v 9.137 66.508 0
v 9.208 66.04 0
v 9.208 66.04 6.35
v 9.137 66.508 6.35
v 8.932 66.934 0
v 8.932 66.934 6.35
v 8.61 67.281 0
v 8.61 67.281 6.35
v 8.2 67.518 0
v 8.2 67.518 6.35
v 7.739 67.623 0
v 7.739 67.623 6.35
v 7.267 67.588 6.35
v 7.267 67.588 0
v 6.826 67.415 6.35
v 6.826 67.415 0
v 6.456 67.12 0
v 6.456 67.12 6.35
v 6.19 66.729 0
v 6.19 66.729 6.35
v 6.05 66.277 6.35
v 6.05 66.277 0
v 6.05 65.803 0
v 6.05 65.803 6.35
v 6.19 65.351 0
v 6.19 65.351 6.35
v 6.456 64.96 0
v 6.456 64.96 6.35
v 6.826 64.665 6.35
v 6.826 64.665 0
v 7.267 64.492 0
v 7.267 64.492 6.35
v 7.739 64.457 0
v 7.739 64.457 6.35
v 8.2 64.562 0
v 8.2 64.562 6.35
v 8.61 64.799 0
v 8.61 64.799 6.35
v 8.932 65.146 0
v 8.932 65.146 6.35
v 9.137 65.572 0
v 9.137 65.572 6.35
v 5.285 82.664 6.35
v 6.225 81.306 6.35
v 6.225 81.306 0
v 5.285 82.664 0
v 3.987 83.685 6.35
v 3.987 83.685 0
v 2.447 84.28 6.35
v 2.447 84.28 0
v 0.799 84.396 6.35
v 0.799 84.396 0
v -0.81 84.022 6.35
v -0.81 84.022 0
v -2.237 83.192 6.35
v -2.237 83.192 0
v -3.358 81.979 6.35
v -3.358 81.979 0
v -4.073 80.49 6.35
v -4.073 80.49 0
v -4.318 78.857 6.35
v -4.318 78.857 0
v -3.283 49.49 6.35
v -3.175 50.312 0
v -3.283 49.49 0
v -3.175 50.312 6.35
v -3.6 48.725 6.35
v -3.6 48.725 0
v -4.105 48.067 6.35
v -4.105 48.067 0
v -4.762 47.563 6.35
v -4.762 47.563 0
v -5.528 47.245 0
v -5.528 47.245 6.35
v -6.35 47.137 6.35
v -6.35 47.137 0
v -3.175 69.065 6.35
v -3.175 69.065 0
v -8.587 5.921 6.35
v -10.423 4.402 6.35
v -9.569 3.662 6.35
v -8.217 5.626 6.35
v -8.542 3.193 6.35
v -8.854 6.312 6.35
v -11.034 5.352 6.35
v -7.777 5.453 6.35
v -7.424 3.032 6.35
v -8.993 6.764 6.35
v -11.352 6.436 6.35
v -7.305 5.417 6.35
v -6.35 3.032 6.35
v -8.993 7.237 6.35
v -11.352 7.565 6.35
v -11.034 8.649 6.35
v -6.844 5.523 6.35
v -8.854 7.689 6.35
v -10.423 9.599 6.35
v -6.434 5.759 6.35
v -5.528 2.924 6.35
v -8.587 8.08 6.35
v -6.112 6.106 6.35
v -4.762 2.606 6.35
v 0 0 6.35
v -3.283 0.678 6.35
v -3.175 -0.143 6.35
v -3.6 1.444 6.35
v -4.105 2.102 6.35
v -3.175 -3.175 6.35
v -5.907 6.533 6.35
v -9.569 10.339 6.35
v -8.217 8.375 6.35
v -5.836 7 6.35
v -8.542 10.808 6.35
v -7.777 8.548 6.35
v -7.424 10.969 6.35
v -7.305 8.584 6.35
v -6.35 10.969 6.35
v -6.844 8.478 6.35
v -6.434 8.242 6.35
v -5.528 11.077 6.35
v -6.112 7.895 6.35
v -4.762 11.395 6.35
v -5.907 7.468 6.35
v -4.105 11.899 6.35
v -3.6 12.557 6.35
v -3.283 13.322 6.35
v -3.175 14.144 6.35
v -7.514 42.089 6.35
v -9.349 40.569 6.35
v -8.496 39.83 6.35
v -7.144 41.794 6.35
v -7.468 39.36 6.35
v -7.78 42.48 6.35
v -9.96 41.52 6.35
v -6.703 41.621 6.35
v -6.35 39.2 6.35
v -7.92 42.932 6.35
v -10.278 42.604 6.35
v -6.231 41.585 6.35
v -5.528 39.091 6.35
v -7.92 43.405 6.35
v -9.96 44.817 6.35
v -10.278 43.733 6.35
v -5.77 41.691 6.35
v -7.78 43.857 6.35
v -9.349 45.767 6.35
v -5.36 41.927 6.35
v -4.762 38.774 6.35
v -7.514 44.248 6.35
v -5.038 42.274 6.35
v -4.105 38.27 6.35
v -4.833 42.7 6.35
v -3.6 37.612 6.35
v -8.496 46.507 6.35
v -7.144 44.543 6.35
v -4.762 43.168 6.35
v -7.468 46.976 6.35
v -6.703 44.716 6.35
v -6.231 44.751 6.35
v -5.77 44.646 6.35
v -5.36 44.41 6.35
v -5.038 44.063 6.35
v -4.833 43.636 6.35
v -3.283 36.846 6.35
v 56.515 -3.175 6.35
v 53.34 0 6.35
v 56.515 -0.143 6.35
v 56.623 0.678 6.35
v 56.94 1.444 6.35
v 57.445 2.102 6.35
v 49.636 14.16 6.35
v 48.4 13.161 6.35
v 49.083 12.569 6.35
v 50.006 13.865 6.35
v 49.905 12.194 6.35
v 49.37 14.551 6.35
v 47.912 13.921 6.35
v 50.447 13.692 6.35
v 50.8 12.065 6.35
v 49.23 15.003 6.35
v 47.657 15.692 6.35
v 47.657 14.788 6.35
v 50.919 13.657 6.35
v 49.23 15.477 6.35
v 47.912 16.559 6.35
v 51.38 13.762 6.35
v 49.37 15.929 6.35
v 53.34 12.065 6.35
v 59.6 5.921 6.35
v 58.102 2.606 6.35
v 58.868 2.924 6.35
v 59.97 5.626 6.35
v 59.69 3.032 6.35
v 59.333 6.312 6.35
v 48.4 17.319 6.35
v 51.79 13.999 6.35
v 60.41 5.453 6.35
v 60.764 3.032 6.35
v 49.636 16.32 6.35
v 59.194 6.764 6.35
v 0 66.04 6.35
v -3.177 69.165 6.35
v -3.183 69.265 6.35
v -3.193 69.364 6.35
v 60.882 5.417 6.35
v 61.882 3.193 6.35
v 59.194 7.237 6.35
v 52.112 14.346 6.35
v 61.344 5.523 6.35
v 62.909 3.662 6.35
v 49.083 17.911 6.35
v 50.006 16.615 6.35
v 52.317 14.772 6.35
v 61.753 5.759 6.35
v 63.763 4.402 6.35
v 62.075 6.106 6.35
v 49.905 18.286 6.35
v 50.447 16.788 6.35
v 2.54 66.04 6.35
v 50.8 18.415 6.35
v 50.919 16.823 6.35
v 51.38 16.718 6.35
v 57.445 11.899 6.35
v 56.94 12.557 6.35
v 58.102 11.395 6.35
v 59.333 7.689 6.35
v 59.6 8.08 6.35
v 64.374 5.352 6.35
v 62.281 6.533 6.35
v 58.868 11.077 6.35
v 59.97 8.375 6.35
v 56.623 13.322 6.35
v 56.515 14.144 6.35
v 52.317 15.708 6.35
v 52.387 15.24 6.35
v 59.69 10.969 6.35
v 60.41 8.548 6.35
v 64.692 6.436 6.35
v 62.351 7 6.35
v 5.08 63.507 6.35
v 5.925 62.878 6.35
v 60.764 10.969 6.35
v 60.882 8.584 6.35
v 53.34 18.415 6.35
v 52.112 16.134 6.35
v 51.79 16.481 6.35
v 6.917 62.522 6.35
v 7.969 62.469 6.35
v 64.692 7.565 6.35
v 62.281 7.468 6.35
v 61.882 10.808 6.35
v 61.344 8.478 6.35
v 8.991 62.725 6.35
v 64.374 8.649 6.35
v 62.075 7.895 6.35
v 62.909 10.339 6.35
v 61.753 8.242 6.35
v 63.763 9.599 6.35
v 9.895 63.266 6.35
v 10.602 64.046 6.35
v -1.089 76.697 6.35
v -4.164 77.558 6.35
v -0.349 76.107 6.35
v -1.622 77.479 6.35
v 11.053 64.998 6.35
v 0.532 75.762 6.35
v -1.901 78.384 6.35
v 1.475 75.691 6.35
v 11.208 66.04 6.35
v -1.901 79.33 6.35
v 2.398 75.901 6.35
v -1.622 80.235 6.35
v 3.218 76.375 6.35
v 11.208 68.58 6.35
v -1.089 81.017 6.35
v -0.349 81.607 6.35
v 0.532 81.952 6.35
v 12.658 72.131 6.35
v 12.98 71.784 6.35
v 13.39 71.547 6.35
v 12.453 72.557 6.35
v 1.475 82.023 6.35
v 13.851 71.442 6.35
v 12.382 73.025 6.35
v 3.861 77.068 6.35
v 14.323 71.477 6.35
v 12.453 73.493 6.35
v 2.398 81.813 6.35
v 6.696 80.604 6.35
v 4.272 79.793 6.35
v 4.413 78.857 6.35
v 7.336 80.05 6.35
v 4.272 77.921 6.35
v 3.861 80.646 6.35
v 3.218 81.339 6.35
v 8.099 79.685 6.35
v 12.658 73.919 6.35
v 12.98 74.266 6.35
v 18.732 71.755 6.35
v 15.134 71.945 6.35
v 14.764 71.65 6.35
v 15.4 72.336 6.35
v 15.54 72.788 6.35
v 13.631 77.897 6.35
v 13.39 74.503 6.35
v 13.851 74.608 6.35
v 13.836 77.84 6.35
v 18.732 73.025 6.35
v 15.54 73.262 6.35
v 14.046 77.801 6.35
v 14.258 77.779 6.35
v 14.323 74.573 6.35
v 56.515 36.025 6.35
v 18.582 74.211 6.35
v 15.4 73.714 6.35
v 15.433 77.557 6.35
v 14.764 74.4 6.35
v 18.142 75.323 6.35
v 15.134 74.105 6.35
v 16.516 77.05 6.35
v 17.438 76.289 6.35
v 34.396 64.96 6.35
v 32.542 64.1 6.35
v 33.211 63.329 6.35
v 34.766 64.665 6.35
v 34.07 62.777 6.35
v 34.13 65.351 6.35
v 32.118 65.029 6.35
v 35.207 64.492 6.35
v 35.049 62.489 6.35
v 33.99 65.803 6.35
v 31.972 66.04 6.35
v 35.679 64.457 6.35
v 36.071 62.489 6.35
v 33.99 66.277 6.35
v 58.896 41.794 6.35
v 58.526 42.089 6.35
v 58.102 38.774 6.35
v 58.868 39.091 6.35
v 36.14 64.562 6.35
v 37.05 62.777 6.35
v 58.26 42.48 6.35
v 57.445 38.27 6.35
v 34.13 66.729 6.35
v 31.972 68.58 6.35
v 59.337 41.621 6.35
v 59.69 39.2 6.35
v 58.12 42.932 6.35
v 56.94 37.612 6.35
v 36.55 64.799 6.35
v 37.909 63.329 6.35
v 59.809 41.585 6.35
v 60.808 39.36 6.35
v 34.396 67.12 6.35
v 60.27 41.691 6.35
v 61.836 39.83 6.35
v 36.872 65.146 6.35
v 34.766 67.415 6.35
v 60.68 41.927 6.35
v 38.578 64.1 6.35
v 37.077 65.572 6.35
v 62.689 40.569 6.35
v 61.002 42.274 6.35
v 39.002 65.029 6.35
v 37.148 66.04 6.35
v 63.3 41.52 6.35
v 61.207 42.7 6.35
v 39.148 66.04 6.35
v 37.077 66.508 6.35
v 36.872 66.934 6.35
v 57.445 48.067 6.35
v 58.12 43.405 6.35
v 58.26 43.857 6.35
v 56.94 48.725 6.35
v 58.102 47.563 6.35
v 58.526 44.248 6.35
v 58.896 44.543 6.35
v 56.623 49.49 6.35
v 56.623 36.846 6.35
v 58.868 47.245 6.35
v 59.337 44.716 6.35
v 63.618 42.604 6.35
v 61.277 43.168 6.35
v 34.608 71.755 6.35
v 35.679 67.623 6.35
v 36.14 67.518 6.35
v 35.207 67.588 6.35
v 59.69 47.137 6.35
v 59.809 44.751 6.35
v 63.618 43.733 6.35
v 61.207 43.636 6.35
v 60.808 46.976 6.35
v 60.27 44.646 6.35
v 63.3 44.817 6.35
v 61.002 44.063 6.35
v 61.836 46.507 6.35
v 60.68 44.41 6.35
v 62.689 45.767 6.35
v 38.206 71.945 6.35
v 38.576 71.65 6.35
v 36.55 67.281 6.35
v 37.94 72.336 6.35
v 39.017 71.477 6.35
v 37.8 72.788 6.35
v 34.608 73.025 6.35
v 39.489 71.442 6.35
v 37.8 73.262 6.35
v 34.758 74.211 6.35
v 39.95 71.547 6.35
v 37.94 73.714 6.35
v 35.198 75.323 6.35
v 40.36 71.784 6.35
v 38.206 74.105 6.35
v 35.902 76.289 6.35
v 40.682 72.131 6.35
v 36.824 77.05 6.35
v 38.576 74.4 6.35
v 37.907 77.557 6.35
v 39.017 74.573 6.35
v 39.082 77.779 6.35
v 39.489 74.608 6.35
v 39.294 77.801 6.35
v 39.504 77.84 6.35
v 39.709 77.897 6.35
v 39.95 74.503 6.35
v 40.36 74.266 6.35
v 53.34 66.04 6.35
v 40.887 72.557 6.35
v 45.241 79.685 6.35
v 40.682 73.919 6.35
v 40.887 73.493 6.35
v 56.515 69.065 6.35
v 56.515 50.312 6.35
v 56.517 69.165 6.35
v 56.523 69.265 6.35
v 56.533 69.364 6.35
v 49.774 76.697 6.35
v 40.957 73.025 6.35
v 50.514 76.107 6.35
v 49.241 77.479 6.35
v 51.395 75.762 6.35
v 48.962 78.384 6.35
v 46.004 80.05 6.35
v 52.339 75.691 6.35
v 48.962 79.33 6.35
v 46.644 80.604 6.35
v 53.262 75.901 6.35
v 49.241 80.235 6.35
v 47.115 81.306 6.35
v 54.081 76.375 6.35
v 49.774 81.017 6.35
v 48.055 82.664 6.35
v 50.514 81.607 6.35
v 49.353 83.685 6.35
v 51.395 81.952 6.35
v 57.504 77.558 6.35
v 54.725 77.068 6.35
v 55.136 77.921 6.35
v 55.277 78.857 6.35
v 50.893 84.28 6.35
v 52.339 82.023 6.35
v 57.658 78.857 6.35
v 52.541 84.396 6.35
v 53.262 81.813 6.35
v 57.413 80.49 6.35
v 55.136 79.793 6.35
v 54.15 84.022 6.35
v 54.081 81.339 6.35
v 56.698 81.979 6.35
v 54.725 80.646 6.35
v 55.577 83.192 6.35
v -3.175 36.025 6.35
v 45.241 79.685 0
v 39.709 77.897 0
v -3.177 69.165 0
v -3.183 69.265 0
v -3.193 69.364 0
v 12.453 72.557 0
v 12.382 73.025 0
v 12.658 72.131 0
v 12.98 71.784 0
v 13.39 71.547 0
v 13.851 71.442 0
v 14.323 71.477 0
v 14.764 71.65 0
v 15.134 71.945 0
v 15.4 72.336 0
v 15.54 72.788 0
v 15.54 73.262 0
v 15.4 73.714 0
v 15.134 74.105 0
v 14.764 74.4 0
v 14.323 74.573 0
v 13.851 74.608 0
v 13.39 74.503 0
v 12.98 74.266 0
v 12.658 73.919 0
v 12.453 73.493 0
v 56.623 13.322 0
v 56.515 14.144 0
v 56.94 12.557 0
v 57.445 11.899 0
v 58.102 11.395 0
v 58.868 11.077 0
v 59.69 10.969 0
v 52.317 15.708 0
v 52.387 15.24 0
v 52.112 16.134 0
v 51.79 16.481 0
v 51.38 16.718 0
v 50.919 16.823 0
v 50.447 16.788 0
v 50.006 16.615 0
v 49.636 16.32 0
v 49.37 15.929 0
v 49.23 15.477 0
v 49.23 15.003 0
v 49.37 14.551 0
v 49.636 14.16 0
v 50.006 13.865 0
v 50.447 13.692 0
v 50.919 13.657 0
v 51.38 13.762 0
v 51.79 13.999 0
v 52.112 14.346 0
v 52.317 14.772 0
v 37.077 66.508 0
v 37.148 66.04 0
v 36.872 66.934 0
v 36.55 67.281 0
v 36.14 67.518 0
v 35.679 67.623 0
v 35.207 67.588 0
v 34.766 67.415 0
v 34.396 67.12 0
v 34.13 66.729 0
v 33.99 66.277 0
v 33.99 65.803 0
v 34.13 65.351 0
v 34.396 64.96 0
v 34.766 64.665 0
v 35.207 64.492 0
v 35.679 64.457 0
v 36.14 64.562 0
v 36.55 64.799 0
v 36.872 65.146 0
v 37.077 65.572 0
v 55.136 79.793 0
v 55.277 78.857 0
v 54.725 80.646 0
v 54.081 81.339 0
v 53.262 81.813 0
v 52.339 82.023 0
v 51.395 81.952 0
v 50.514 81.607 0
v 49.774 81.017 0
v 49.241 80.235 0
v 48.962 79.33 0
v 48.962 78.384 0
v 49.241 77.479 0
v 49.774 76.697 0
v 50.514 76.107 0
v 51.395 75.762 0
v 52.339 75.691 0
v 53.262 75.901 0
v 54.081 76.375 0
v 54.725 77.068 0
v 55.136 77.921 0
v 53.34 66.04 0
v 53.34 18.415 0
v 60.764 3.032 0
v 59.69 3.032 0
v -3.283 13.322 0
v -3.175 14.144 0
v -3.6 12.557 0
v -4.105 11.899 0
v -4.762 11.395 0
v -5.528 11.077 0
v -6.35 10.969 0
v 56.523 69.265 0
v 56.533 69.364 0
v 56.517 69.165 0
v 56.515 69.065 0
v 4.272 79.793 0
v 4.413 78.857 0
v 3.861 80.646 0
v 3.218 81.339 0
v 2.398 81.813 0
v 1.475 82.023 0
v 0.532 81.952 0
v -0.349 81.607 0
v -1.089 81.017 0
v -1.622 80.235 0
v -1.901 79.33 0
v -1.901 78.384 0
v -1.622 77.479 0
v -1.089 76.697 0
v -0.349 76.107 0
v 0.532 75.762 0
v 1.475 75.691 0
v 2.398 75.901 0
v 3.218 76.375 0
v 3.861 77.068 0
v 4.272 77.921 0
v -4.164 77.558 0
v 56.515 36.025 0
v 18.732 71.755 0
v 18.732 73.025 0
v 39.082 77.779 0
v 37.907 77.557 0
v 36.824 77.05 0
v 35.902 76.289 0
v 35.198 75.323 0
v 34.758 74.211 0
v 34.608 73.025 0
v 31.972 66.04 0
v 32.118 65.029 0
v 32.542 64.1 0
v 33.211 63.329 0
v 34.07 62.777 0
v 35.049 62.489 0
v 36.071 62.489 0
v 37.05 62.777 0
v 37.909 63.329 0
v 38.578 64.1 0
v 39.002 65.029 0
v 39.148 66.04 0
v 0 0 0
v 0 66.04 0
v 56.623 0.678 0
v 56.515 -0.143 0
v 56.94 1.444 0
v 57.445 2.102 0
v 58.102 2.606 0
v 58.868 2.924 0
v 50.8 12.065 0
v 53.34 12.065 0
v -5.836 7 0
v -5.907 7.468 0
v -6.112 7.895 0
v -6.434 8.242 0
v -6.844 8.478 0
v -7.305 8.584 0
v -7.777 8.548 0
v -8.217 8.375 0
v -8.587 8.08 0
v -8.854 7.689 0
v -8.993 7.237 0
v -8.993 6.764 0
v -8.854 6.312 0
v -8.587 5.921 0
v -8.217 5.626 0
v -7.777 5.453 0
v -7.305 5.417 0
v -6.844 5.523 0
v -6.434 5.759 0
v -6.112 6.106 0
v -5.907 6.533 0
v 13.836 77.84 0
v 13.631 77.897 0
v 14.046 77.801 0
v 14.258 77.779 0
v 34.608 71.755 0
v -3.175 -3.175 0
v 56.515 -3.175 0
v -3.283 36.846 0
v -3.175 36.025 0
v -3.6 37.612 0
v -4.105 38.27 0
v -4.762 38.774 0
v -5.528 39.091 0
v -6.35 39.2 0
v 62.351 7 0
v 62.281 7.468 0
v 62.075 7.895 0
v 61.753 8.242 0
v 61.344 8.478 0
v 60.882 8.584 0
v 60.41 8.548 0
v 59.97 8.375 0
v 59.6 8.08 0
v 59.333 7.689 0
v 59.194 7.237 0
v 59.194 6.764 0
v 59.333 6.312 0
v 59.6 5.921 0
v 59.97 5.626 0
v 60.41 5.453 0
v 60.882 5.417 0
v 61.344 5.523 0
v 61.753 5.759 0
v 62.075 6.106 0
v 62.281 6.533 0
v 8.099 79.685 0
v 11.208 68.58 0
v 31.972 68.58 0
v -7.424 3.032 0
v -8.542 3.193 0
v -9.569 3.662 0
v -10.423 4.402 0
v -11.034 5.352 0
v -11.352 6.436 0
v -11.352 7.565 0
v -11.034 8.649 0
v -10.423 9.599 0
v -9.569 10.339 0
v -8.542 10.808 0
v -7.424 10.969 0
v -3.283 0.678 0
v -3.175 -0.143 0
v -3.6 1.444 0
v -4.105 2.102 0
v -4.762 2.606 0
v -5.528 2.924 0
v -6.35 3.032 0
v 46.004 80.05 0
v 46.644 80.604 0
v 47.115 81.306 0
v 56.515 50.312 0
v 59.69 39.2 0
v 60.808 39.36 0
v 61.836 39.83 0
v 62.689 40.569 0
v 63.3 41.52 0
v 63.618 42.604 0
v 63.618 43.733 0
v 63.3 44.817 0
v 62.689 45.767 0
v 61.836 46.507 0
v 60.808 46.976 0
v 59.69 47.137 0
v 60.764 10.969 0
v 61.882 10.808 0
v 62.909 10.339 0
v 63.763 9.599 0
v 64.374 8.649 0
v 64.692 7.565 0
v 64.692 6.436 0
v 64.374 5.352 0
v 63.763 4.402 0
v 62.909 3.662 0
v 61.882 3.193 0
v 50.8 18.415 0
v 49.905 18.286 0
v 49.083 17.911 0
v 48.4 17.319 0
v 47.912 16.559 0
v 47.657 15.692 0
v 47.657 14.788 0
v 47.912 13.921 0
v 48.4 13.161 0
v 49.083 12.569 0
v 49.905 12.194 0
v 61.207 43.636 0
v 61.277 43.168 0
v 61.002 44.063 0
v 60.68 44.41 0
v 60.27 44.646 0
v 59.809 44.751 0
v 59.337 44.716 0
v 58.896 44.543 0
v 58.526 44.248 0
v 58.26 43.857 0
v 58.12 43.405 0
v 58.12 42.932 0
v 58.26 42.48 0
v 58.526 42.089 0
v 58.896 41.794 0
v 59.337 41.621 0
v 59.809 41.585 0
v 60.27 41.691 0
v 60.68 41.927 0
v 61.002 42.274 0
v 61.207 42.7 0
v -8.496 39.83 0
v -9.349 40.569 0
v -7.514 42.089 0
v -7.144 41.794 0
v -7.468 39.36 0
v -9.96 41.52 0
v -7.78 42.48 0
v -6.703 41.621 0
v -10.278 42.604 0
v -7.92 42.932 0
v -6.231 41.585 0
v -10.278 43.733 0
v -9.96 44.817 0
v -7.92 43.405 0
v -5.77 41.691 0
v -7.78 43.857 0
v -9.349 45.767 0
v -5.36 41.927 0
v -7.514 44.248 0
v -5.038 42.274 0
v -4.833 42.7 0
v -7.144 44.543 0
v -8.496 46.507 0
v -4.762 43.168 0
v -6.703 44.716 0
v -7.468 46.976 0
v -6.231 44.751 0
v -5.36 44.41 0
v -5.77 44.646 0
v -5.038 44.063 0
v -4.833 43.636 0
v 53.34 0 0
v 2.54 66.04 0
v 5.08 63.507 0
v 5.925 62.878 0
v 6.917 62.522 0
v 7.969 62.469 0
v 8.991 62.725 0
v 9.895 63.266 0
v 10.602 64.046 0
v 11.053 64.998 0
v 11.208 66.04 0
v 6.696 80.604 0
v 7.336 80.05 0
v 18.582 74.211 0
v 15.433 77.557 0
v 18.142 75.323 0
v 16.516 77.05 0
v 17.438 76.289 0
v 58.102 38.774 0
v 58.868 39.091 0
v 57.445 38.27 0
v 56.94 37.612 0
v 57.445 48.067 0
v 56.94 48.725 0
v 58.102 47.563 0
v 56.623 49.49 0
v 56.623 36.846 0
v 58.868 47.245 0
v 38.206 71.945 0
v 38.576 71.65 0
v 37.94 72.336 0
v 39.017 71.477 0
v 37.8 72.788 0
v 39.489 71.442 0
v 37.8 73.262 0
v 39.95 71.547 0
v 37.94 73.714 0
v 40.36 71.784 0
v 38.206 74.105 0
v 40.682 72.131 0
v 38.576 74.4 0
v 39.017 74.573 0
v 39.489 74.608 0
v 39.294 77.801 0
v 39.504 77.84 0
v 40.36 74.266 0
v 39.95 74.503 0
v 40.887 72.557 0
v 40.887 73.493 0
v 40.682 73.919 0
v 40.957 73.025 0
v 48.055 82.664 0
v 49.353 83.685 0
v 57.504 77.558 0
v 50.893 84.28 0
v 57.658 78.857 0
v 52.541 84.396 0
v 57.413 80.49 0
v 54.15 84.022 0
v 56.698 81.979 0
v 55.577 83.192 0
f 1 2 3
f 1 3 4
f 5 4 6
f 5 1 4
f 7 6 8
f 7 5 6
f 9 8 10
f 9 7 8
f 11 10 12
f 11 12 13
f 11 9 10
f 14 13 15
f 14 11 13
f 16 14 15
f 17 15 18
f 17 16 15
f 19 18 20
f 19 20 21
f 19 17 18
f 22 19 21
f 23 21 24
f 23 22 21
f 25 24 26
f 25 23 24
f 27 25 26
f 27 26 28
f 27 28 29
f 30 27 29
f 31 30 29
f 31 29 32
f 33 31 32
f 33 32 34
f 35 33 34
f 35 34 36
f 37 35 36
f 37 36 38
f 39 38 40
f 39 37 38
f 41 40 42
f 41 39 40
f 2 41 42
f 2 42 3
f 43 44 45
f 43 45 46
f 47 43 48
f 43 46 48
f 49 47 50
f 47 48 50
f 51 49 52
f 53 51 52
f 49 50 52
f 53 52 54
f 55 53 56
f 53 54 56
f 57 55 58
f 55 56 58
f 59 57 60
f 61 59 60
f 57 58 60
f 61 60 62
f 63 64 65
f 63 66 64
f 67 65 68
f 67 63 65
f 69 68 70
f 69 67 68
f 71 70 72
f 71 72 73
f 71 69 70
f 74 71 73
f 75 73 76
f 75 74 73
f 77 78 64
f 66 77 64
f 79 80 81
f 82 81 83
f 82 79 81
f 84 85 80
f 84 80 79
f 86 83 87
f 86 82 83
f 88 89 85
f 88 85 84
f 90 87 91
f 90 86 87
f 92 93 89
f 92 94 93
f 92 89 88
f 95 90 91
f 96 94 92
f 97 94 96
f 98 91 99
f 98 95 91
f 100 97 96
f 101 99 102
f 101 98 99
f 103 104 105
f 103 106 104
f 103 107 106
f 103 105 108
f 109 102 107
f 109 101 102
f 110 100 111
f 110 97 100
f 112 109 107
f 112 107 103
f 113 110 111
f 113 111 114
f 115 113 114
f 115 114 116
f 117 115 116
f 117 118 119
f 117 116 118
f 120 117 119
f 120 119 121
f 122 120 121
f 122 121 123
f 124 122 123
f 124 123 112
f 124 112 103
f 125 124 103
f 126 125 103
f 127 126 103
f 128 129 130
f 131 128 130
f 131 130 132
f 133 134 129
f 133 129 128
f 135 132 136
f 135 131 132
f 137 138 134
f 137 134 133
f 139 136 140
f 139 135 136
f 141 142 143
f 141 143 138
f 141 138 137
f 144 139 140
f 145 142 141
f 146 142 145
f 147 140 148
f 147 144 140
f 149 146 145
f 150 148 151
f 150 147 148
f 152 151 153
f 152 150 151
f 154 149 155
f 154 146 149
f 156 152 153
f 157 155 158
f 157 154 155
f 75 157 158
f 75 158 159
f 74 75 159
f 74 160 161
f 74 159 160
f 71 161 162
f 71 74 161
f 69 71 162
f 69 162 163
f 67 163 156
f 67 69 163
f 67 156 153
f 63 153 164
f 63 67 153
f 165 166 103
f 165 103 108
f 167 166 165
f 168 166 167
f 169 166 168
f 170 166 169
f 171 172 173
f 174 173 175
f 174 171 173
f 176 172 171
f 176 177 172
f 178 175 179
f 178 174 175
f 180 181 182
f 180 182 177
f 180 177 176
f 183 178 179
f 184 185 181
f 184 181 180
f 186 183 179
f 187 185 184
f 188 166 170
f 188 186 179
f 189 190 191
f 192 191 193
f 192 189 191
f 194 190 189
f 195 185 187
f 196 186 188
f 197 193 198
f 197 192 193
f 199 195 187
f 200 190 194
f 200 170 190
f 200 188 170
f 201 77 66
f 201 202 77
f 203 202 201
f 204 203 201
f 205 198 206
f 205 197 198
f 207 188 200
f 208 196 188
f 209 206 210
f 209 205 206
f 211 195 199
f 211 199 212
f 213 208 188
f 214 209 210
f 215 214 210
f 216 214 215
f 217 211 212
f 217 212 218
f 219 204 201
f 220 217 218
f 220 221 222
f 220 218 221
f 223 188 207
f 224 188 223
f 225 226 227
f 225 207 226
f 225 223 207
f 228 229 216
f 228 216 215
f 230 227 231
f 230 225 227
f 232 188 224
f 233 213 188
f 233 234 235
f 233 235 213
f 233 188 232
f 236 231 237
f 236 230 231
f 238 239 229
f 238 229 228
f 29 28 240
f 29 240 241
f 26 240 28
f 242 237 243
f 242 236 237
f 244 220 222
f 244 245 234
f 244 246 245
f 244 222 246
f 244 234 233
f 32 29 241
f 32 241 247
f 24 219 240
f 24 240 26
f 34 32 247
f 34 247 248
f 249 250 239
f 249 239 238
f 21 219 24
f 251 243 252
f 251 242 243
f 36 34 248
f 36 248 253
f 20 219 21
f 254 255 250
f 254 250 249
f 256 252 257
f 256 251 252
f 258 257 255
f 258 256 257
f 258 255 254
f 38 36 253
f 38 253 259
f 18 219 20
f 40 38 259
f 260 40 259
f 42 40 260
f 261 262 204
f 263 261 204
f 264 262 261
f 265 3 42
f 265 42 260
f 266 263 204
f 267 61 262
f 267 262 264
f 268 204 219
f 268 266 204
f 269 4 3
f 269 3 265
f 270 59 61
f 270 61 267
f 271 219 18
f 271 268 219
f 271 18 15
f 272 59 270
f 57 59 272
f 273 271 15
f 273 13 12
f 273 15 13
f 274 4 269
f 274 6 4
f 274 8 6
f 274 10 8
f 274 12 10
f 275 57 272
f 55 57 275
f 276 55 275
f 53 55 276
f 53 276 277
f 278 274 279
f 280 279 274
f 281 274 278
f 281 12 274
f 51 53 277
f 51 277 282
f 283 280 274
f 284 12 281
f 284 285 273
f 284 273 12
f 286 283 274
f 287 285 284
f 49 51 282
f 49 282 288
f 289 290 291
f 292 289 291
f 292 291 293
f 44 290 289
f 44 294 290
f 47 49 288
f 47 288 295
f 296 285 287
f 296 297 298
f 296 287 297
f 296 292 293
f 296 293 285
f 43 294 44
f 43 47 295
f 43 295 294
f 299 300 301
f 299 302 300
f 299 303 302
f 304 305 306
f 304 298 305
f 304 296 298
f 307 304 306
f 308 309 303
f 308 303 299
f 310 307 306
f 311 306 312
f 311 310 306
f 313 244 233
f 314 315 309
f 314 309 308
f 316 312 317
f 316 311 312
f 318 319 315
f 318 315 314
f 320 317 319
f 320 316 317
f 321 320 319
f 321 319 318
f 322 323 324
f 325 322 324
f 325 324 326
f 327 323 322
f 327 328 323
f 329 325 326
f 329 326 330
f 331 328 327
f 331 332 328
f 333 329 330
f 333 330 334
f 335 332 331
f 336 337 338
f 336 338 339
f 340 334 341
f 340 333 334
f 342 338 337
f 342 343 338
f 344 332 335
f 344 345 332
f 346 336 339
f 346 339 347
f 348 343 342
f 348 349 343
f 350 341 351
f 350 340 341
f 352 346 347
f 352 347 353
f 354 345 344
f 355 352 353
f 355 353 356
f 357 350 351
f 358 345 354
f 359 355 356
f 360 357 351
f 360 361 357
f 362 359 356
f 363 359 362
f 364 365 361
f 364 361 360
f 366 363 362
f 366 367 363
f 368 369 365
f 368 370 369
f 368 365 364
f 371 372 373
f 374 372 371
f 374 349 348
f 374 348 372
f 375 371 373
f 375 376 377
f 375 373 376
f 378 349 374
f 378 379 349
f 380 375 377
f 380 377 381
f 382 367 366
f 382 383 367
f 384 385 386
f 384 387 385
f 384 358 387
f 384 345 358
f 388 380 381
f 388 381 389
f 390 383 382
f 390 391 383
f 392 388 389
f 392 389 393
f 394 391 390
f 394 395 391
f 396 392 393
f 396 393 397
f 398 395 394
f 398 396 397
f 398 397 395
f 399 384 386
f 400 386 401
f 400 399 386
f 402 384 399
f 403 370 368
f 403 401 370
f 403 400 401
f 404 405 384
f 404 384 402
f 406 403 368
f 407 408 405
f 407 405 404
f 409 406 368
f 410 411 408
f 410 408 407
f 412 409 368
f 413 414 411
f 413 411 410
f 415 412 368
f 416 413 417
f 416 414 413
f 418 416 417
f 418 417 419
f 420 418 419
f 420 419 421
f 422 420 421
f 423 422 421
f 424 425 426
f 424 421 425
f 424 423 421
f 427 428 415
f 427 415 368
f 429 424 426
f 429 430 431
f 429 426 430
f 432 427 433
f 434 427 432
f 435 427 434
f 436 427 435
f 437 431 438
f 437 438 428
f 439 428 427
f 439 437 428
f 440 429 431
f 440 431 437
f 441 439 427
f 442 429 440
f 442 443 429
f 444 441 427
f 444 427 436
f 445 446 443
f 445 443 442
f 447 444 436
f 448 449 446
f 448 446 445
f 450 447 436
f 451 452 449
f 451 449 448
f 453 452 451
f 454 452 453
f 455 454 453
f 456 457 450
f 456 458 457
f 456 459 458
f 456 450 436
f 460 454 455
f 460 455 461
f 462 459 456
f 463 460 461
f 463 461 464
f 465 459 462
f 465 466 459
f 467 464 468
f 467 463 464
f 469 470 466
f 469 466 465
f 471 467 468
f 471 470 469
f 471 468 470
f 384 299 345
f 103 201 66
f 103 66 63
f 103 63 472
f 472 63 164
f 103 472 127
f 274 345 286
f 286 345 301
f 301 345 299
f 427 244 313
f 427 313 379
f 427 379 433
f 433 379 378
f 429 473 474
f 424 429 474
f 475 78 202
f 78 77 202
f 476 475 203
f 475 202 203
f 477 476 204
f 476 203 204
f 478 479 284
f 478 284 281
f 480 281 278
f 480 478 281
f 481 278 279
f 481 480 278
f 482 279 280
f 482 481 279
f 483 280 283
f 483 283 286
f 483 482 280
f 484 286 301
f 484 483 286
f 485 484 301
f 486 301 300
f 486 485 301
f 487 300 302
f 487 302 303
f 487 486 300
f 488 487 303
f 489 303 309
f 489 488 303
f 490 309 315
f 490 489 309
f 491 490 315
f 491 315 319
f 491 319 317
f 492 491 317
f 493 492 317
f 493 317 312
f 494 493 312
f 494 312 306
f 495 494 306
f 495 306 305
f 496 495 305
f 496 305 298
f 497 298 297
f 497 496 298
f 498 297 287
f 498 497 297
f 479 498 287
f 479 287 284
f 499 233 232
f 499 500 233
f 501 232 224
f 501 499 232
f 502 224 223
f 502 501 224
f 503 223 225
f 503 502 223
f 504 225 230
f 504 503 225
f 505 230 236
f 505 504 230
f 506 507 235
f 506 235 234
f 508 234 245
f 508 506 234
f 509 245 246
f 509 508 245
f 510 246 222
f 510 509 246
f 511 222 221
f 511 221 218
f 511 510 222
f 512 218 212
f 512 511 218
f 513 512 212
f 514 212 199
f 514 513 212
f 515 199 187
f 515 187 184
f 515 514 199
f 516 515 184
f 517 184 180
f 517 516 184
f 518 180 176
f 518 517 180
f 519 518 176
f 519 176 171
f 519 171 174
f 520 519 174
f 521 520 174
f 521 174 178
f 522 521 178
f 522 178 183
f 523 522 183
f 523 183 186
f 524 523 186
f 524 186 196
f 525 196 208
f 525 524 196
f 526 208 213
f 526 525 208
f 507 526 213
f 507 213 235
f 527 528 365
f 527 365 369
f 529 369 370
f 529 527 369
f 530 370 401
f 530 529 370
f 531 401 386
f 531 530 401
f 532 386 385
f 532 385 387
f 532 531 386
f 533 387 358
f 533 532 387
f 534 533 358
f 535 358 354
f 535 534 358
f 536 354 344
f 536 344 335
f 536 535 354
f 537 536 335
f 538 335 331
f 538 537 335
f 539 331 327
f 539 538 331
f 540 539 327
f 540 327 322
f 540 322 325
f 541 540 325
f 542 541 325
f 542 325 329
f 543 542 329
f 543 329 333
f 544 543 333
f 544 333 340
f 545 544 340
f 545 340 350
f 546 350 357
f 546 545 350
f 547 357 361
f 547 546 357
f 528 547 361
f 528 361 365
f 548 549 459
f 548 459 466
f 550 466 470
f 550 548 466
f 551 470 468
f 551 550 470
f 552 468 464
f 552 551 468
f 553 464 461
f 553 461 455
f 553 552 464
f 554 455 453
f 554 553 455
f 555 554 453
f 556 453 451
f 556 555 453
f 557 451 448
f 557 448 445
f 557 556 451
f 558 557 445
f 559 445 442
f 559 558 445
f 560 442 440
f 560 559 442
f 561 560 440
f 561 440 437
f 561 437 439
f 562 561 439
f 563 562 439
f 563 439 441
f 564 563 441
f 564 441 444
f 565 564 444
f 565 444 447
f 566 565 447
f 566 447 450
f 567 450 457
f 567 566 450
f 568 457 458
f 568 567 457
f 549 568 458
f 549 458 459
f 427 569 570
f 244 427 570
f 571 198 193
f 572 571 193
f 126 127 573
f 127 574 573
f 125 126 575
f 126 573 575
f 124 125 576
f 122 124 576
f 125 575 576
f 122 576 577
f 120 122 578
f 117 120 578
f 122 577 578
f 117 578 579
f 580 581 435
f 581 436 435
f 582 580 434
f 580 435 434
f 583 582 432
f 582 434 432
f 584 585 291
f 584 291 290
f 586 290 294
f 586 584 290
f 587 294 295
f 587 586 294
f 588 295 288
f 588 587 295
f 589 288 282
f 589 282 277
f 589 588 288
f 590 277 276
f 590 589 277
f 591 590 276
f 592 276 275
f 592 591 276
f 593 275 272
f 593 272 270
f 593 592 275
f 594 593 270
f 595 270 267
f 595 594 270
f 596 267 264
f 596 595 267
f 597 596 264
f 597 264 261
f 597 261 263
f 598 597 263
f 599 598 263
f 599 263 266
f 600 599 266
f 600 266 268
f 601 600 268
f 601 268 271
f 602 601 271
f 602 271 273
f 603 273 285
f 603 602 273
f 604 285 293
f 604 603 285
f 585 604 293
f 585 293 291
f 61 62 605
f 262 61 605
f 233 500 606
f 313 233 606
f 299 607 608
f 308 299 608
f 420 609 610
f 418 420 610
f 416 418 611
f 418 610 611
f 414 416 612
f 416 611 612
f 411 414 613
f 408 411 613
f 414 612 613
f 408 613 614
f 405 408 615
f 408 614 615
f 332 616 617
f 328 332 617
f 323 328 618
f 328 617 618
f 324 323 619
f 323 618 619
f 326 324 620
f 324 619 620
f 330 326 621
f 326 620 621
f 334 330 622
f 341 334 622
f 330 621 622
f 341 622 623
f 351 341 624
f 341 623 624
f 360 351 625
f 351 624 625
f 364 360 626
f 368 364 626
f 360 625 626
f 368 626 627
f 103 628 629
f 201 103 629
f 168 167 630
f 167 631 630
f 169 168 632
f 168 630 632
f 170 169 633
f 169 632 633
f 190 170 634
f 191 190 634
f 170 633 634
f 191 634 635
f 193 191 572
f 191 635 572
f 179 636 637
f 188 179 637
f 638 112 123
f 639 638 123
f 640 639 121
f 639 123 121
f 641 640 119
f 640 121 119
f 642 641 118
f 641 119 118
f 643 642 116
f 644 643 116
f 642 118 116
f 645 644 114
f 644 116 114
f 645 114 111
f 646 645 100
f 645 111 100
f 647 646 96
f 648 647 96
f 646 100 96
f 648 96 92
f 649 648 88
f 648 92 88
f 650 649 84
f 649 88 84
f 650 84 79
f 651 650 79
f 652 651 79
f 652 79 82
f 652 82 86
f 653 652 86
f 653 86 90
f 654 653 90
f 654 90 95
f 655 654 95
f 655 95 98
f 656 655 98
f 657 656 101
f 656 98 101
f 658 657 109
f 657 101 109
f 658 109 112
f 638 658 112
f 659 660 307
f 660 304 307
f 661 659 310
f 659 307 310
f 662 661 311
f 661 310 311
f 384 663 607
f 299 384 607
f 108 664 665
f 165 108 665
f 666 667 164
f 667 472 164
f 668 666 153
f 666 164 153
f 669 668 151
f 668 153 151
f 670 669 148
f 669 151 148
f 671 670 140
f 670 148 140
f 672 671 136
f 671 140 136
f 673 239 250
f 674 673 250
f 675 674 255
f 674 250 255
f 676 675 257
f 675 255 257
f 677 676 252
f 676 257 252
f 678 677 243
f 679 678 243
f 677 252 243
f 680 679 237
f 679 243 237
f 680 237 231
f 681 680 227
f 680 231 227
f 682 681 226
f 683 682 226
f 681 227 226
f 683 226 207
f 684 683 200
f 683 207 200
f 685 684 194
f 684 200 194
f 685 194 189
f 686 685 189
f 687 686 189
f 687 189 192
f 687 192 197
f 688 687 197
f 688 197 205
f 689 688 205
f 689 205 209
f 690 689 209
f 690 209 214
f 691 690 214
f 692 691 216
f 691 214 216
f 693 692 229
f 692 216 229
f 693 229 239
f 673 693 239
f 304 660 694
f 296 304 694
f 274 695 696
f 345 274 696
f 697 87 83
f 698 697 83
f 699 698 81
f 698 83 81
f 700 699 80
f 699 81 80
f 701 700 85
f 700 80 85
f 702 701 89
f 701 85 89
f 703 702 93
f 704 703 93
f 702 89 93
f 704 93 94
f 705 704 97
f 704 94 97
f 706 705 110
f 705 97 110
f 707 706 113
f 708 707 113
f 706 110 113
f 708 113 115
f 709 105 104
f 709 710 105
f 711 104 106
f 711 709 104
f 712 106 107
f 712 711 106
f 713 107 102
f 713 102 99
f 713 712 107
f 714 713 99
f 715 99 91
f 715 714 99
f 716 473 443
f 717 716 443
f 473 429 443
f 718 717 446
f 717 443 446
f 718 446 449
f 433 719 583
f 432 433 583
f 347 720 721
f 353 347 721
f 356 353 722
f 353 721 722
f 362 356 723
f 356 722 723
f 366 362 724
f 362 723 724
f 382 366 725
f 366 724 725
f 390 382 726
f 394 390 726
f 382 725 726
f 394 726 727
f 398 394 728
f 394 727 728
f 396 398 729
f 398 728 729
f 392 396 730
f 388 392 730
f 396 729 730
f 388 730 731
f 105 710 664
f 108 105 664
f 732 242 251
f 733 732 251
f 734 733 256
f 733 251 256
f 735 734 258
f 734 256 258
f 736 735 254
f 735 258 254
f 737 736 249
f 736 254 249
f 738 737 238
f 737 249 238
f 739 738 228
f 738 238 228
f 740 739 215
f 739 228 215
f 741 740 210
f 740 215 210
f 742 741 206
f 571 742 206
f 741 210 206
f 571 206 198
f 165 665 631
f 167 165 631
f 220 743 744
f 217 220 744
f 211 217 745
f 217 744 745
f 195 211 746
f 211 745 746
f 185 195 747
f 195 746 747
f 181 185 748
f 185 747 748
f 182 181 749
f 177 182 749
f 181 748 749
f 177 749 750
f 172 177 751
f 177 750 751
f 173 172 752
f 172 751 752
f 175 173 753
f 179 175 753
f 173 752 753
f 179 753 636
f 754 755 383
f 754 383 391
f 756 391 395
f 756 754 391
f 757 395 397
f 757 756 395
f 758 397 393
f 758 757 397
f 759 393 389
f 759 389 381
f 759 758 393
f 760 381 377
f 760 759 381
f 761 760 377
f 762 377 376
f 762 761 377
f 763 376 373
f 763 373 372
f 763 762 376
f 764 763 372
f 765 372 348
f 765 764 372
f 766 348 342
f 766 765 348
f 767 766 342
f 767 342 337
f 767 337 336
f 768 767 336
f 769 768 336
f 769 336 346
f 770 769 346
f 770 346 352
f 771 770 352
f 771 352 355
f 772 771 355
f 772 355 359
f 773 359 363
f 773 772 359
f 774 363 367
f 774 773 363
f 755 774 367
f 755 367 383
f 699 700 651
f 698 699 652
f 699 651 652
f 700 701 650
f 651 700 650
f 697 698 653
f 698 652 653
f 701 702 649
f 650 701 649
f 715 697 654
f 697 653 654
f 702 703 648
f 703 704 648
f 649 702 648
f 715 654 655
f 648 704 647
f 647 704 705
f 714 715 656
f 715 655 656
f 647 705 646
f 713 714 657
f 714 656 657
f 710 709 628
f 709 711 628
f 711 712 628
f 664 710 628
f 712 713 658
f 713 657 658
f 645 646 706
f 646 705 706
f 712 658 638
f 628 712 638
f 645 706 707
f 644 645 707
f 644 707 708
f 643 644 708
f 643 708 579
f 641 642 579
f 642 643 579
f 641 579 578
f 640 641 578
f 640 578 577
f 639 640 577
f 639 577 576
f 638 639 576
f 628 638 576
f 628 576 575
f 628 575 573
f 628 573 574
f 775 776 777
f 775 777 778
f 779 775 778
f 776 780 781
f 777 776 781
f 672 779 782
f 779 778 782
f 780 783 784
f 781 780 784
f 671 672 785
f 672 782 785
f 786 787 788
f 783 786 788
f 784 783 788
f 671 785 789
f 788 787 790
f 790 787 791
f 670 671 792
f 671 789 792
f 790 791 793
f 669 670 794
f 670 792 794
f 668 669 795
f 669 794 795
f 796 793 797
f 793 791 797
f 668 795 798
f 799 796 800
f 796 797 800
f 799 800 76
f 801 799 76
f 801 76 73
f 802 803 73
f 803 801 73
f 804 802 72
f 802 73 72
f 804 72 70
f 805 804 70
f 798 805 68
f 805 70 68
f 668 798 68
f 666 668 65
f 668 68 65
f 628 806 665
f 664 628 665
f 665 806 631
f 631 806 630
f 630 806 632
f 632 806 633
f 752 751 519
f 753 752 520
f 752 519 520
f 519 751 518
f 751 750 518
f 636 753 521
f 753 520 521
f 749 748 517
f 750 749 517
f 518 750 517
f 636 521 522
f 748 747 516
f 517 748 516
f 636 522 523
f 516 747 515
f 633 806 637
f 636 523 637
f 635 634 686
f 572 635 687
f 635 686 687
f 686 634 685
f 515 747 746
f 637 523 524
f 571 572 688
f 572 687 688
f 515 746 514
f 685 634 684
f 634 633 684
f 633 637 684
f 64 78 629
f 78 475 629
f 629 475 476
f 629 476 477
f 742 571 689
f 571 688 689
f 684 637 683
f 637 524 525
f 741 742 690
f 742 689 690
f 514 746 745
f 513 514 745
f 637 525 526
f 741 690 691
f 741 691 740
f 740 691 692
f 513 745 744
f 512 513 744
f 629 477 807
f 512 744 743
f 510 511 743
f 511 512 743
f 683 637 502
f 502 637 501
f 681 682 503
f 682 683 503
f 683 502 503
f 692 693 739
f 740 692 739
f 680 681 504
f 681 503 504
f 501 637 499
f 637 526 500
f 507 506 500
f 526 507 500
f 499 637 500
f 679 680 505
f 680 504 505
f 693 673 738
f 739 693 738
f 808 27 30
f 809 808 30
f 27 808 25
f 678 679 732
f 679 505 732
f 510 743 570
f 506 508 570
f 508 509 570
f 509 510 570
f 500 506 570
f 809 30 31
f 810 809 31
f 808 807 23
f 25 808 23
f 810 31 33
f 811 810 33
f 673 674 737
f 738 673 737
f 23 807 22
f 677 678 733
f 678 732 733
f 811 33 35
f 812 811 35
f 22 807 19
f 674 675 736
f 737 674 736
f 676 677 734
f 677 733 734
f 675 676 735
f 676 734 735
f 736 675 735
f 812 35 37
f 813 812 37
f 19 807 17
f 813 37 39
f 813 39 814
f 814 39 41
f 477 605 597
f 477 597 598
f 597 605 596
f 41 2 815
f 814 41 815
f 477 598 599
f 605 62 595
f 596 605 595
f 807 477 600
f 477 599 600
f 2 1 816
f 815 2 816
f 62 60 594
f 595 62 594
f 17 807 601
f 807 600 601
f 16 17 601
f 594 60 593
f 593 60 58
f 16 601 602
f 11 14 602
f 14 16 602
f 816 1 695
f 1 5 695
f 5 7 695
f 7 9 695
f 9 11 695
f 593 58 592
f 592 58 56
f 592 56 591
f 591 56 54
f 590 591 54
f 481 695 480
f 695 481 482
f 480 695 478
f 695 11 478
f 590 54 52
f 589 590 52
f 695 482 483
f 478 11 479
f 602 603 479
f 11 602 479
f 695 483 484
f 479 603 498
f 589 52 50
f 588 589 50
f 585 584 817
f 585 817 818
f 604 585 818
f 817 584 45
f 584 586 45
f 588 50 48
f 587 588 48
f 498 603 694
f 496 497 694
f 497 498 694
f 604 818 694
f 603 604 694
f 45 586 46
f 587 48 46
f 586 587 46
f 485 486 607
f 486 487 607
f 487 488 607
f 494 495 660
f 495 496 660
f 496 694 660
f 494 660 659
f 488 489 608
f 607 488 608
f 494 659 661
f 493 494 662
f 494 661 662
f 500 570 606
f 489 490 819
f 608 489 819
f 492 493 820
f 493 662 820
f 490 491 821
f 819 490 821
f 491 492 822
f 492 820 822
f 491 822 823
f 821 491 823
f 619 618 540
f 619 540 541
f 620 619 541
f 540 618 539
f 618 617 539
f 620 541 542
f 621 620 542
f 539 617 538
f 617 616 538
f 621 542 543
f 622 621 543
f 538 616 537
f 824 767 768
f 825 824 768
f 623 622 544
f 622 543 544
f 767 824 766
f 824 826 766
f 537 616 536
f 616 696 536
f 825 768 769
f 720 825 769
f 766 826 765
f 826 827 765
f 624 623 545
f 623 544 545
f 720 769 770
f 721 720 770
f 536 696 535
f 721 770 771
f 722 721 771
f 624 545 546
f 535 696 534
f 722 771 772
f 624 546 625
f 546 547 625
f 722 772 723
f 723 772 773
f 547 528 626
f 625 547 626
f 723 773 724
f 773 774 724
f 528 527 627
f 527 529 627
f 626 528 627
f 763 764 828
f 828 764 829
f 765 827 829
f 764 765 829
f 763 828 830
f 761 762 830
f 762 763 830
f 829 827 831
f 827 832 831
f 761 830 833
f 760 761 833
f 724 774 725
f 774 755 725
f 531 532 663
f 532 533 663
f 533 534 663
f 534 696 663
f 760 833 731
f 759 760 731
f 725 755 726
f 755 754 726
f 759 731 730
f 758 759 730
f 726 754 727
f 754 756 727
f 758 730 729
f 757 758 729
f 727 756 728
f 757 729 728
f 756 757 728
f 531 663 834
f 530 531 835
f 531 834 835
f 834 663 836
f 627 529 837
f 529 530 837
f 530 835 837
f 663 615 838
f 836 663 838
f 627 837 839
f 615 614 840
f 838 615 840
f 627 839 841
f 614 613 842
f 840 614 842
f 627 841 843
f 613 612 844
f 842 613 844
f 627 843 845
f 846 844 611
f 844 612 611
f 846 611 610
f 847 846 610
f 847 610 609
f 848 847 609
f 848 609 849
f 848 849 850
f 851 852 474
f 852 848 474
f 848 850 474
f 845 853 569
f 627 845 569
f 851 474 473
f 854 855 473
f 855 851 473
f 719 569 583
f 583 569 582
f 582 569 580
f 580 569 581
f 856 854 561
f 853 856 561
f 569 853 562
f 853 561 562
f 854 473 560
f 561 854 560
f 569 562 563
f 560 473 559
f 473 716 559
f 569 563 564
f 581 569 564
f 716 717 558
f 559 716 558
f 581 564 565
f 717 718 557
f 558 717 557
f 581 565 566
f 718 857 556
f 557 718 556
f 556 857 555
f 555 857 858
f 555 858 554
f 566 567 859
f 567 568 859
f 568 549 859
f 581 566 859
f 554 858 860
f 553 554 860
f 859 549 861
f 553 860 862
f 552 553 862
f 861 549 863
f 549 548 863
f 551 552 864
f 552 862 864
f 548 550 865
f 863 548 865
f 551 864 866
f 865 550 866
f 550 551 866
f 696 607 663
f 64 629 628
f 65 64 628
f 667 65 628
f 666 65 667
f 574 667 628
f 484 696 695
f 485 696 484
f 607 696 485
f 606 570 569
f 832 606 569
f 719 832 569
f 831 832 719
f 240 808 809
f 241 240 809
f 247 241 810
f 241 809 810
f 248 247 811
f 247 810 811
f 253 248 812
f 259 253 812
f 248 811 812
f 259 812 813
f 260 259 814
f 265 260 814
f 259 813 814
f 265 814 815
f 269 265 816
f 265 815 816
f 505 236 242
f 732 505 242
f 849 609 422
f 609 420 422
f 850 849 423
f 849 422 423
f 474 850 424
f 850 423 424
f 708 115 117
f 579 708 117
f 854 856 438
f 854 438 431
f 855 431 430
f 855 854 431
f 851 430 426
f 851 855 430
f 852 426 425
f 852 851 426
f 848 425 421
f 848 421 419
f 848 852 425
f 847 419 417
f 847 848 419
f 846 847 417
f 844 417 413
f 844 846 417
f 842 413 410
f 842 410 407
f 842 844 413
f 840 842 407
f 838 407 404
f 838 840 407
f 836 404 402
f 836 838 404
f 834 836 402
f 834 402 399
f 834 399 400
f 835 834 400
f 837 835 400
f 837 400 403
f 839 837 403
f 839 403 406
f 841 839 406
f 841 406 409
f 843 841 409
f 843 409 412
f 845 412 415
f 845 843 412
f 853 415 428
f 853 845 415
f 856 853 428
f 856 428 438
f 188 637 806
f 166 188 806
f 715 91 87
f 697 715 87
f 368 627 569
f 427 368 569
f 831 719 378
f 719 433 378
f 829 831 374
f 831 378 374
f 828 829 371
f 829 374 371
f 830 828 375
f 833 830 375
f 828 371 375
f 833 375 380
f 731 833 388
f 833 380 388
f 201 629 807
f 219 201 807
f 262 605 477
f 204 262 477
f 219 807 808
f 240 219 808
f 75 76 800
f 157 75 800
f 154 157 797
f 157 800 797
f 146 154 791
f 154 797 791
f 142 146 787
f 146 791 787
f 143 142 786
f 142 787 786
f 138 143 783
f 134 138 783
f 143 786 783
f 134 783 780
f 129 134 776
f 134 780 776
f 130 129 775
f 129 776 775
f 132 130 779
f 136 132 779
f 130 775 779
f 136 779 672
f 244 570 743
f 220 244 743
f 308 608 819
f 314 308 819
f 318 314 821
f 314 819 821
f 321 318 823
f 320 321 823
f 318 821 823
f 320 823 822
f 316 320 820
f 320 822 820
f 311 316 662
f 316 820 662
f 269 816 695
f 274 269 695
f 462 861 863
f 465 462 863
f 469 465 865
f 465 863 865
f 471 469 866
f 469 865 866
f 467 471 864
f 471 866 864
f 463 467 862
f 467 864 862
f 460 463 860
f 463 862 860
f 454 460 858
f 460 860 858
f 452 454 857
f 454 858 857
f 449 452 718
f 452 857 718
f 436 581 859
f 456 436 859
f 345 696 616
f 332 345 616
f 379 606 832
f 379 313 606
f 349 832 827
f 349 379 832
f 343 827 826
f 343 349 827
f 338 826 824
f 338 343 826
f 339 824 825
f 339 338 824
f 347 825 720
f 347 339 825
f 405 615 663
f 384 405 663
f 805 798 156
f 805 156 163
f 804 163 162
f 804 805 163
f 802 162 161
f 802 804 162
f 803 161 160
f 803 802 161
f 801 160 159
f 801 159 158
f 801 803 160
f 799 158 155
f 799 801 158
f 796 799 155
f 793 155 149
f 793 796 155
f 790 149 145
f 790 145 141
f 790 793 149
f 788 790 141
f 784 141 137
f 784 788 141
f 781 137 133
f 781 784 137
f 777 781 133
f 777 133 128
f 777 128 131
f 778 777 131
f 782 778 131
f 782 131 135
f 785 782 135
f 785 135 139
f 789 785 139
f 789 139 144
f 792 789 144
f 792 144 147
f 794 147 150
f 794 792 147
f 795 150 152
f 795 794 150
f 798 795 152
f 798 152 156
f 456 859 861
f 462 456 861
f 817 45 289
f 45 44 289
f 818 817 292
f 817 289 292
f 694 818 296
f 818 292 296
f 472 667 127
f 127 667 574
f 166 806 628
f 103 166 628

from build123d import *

# Parameters (mm, degrees)
SKETCH1_R           = 1.5875
BOSS_EXTRUDE1_DEPTH = 6.35
SKETCH3_R           = 1.5875
BOSS_EXTRUDE2_DEPTH = 6.35
FILLET1_R           = 3.175
BOSS_EXTRUDE3_START = -6.35
SKETCH4_R           = 3.175
SKETCH4_R_2         = 1.5875
BOSS_EXTRUDE3_DEPTH = 6.35
FILLET2_R           = 3.175
FILLET3_R           = 2.54


with BuildPart() as part:
    # Sketch1 → Boss-Extrude1 (new body)
    with BuildSketch(Plane.XY):
        with BuildLine():
            Line((13.97, -3.175), (39.37, -3.175))
            Line((39.37, -3.175), (56.515, -3.175))
            Line((56.515, -3.175), (56.515, 69.215))
            Line((56.515, 69.215), (41.625085175, 77.219758289))
            ThreePointArc((41.625085175, 77.219758289), (36.926481727, 77.112863097), (34.6075, 73.025))
            Line((34.6075, 73.025), (34.6075, 71.755))
            Line((34.6075, 71.755), (18.7325, 71.755))
            Line((18.7325, 71.755), (18.7325, 73.025))
            ThreePointArc((18.7325, 73.025), (16.413518273, 77.112863097), (11.714914825, 77.219758289))
            Line((11.714914825, 77.219758289), (-3.175, 69.215))
            Line((-3.175, 69.215), (-3.175, -3.175))
            Line((-3.175, -3.175), (13.97, -3.175))
        make_face()
        with Locations((35.56, 66.04)):
            Circle(SKETCH1_R, mode=Mode.SUBTRACT)
        with Locations((7.62, 66.04)):
            Circle(SKETCH1_R, mode=Mode.SUBTRACT)
        with Locations((50.8, 15.24)):
            Circle(SKETCH1_R, mode=Mode.SUBTRACT)
        with Locations((39.37, 73.025)):
            Circle(SKETCH1_R, mode=Mode.SUBTRACT)
        with Locations(Location((13.97, 73.025, 0), (0, 0, 180))):
            Circle(SKETCH1_R, mode=Mode.SUBTRACT)
        with BuildLine():
            Line((0, 11.093834149), (0, 16.5575))
            Line((0, 16.5575), (0, 66.04))
            Line((0, 66.04), (2.54, 66.04))
            Line((2.54, 66.04), (5.08, 63.506513025))
            ThreePointArc((5.08, 63.506513025), (8.990749111, 62.724701654), (11.2075, 66.04))
            Line((11.2075, 66.04), (11.2075, 68.58))
            Line((11.2075, 68.58), (31.9725, 68.58))
            Line((31.9725, 68.58), (31.9725, 66.04))
            ThreePointArc((31.9725, 66.04), (35.56, 62.4525), (39.1475, 66.04))
            Line((39.1475, 66.04), (40.386, 66.04))
            Line((40.386, 66.04), (53.34, 66.04))
            Line((53.34, 66.04), (53.34, 18.415))
            Line((53.34, 18.415), (50.8, 18.415))
            ThreePointArc((50.8, 18.415), (47.625, 15.24), (50.8, 12.065))
            Line((50.8, 12.065), (53.34, 12.065))
            Line((53.34, 12.065), (53.34, 0))
            Line((53.34, 0), (0, 0))
            Line((0, 0), (0, 11.093834149))
        make_face(mode=Mode.SUBTRACT)
    extrude(amount=BOSS_EXTRUDE1_DEPTH)

    # Sketch3 → Boss-Extrude2 (add)
    # profile 1 of 2: a face of its own
    with BuildSketch(Plane.XY.offset(6.35)):
        with BuildLine():
            Line((-7.423658, 10.969244), (-3.175, 10.969244))
            Line((-3.175, 10.969244), (-3.175, 3.031744))
            Line((-3.175, 3.031744), (-7.423658, 3.031744))
            ThreePointArc((-7.423658, 3.031744), (-11.392408, 7.000494), (-7.423658, 10.969244))
        make_face()
        with Locations((-7.423658, 7.000494)):
            Circle(SKETCH3_R, mode=Mode.SUBTRACT)
    # profile 2 of 2: a face of its own
    with BuildSketch(Plane.XY.offset(6.35)):
        with BuildLine():
            Line((56.515, 3.031744), (56.515, 10.969244))
            Line((56.515, 10.969244), (60.763658, 10.969244))
            ThreePointArc((60.763658, 10.969244), (64.732408, 7.000494), (60.763658, 3.031744))
            Line((60.763658, 3.031744), (56.515, 3.031744))
        make_face()
        with Locations((60.763658, 7.000494)):
            Circle(SKETCH3_R, mode=Mode.SUBTRACT)
    extrude(amount=-BOSS_EXTRUDE2_DEPTH)

    # Fillet1
    fillet1_edges = [part.edges().sort_by_distance(p)[0] for p in [
        (56.515, 3.031744, 3.175),
        (56.515, 10.969244, 3.175),
        (-3.175, 10.969244, 3.175),
        (-3.175, 3.031744, 3.175),
    ]]
    fillet(fillet1_edges, radius=FILLET1_R)

    # Sketch4 → Boss-Extrude3 (add)
    # profile 1 of 4: a face of its own
    with BuildSketch(Plane.XY.offset(6.35).offset(BOSS_EXTRUDE3_START)):
        with BuildLine():
            Line((-4.164100811, 77.557794463), (-3.175, 69.215))
            Line((-3.175, 69.215), (11.714914825, 77.219758289))
            ThreePointArc((11.714914825, 77.219758289), (12.807272625, 77.643384057), (13.97, 77.7875))
            Line((13.97, 77.7875), (6.640337345, 80.156211745))
            ThreePointArc((6.640337345, 80.156211745), (0.583964497, 84.374611001), (-4.318131733, 78.857003104))
            Line((-4.318131733, 78.857003104), (-4.164100811, 77.557794463))
        make_face()
        with Locations((1.238118267, 78.857003104)):
            Circle(SKETCH4_R, mode=Mode.SUBTRACT)
    # profile 2 of 4: a face of its own
    with BuildSketch(Plane.XY.offset(6.35).offset(BOSS_EXTRUDE3_START)):
        with BuildLine():
            Line((41.625085175, 77.219758289), (56.515, 69.215))
            Line((56.515, 69.215), (57.504100811, 77.557794463))
            Line((57.504100811, 77.557794463), (57.658131733, 78.857003104))
            ThreePointArc((57.658131733, 78.857003104), (52.756035503, 84.374611001), (46.699662655, 80.156211745))
            Line((46.699662655, 80.156211745), (39.37, 77.7875))
            ThreePointArc((39.37, 77.7875), (40.532727375, 77.643384057), (41.625085175, 77.219758289))
        make_face()
        with Locations((52.101881733, 78.857003104)):
            Circle(SKETCH4_R, mode=Mode.SUBTRACT)
    # profile 3 of 4: a face of its own
    with BuildSketch(Plane.XY.offset(6.35).offset(BOSS_EXTRUDE3_START)):
        with BuildLine():
            Line((56.515, 47.137146639), (56.515, 39.199646639))
            Line((56.515, 39.199646639), (59.69, 39.199646639))
            ThreePointArc((59.69, 39.199646639), (63.65875, 43.168396639), (59.69, 47.137146639))
            Line((59.69, 47.137146639), (56.515, 47.137146639))
        make_face()
        with Locations((59.69, 43.168396639)):
            Circle(SKETCH4_R_2, mode=Mode.SUBTRACT)
    # profile 4 of 4: a face of its own
    with BuildSketch(Plane.XY.offset(6.35).offset(BOSS_EXTRUDE3_START)):
        with BuildLine():
            Line((-3.175, 47.137146639), (-6.35, 47.137146639))
            ThreePointArc((-6.35, 47.137146639), (-10.31875, 43.168396639), (-6.35, 39.199646639))
            Line((-6.35, 39.199646639), (-3.175, 39.199646639))
            Line((-3.175, 39.199646639), (-3.175, 47.137146639))
        make_face()
        with Locations((-6.35, 43.168396639)):
            Circle(SKETCH4_R_2, mode=Mode.SUBTRACT)
    extrude(amount=BOSS_EXTRUDE3_DEPTH)

    # Fillet2
    fillet2_edges = [part.edges().sort_by_distance(p)[0] for p in [
        (46.699662655, 80.156211745, 3.175),
        (6.640337345, 80.156211745, 3.175),
        (-3.175, 47.137146639, 3.175),
        (56.515, 47.137146639, 3.175),
        (56.515, 39.199646639, 3.175),
        (-3.175, 39.199646639, 3.175),
    ]]
    fillet(fillet2_edges, radius=FILLET2_R - 0.0001)  # a hair under: the kernel refuses the full size

    # Fillet3
    fillet3_edges = [part.edges().sort_by_distance(p)[0] for p in [
        (-3.175, 69.215, 3.175),
        (13.97, 77.7875, 3.175),
        (56.515, 69.215, 3.175),
        (39.37, 77.7875, 3.175),
    ]]
    fillet(fillet3_edges, radius=FILLET3_R)


solid = part.part
